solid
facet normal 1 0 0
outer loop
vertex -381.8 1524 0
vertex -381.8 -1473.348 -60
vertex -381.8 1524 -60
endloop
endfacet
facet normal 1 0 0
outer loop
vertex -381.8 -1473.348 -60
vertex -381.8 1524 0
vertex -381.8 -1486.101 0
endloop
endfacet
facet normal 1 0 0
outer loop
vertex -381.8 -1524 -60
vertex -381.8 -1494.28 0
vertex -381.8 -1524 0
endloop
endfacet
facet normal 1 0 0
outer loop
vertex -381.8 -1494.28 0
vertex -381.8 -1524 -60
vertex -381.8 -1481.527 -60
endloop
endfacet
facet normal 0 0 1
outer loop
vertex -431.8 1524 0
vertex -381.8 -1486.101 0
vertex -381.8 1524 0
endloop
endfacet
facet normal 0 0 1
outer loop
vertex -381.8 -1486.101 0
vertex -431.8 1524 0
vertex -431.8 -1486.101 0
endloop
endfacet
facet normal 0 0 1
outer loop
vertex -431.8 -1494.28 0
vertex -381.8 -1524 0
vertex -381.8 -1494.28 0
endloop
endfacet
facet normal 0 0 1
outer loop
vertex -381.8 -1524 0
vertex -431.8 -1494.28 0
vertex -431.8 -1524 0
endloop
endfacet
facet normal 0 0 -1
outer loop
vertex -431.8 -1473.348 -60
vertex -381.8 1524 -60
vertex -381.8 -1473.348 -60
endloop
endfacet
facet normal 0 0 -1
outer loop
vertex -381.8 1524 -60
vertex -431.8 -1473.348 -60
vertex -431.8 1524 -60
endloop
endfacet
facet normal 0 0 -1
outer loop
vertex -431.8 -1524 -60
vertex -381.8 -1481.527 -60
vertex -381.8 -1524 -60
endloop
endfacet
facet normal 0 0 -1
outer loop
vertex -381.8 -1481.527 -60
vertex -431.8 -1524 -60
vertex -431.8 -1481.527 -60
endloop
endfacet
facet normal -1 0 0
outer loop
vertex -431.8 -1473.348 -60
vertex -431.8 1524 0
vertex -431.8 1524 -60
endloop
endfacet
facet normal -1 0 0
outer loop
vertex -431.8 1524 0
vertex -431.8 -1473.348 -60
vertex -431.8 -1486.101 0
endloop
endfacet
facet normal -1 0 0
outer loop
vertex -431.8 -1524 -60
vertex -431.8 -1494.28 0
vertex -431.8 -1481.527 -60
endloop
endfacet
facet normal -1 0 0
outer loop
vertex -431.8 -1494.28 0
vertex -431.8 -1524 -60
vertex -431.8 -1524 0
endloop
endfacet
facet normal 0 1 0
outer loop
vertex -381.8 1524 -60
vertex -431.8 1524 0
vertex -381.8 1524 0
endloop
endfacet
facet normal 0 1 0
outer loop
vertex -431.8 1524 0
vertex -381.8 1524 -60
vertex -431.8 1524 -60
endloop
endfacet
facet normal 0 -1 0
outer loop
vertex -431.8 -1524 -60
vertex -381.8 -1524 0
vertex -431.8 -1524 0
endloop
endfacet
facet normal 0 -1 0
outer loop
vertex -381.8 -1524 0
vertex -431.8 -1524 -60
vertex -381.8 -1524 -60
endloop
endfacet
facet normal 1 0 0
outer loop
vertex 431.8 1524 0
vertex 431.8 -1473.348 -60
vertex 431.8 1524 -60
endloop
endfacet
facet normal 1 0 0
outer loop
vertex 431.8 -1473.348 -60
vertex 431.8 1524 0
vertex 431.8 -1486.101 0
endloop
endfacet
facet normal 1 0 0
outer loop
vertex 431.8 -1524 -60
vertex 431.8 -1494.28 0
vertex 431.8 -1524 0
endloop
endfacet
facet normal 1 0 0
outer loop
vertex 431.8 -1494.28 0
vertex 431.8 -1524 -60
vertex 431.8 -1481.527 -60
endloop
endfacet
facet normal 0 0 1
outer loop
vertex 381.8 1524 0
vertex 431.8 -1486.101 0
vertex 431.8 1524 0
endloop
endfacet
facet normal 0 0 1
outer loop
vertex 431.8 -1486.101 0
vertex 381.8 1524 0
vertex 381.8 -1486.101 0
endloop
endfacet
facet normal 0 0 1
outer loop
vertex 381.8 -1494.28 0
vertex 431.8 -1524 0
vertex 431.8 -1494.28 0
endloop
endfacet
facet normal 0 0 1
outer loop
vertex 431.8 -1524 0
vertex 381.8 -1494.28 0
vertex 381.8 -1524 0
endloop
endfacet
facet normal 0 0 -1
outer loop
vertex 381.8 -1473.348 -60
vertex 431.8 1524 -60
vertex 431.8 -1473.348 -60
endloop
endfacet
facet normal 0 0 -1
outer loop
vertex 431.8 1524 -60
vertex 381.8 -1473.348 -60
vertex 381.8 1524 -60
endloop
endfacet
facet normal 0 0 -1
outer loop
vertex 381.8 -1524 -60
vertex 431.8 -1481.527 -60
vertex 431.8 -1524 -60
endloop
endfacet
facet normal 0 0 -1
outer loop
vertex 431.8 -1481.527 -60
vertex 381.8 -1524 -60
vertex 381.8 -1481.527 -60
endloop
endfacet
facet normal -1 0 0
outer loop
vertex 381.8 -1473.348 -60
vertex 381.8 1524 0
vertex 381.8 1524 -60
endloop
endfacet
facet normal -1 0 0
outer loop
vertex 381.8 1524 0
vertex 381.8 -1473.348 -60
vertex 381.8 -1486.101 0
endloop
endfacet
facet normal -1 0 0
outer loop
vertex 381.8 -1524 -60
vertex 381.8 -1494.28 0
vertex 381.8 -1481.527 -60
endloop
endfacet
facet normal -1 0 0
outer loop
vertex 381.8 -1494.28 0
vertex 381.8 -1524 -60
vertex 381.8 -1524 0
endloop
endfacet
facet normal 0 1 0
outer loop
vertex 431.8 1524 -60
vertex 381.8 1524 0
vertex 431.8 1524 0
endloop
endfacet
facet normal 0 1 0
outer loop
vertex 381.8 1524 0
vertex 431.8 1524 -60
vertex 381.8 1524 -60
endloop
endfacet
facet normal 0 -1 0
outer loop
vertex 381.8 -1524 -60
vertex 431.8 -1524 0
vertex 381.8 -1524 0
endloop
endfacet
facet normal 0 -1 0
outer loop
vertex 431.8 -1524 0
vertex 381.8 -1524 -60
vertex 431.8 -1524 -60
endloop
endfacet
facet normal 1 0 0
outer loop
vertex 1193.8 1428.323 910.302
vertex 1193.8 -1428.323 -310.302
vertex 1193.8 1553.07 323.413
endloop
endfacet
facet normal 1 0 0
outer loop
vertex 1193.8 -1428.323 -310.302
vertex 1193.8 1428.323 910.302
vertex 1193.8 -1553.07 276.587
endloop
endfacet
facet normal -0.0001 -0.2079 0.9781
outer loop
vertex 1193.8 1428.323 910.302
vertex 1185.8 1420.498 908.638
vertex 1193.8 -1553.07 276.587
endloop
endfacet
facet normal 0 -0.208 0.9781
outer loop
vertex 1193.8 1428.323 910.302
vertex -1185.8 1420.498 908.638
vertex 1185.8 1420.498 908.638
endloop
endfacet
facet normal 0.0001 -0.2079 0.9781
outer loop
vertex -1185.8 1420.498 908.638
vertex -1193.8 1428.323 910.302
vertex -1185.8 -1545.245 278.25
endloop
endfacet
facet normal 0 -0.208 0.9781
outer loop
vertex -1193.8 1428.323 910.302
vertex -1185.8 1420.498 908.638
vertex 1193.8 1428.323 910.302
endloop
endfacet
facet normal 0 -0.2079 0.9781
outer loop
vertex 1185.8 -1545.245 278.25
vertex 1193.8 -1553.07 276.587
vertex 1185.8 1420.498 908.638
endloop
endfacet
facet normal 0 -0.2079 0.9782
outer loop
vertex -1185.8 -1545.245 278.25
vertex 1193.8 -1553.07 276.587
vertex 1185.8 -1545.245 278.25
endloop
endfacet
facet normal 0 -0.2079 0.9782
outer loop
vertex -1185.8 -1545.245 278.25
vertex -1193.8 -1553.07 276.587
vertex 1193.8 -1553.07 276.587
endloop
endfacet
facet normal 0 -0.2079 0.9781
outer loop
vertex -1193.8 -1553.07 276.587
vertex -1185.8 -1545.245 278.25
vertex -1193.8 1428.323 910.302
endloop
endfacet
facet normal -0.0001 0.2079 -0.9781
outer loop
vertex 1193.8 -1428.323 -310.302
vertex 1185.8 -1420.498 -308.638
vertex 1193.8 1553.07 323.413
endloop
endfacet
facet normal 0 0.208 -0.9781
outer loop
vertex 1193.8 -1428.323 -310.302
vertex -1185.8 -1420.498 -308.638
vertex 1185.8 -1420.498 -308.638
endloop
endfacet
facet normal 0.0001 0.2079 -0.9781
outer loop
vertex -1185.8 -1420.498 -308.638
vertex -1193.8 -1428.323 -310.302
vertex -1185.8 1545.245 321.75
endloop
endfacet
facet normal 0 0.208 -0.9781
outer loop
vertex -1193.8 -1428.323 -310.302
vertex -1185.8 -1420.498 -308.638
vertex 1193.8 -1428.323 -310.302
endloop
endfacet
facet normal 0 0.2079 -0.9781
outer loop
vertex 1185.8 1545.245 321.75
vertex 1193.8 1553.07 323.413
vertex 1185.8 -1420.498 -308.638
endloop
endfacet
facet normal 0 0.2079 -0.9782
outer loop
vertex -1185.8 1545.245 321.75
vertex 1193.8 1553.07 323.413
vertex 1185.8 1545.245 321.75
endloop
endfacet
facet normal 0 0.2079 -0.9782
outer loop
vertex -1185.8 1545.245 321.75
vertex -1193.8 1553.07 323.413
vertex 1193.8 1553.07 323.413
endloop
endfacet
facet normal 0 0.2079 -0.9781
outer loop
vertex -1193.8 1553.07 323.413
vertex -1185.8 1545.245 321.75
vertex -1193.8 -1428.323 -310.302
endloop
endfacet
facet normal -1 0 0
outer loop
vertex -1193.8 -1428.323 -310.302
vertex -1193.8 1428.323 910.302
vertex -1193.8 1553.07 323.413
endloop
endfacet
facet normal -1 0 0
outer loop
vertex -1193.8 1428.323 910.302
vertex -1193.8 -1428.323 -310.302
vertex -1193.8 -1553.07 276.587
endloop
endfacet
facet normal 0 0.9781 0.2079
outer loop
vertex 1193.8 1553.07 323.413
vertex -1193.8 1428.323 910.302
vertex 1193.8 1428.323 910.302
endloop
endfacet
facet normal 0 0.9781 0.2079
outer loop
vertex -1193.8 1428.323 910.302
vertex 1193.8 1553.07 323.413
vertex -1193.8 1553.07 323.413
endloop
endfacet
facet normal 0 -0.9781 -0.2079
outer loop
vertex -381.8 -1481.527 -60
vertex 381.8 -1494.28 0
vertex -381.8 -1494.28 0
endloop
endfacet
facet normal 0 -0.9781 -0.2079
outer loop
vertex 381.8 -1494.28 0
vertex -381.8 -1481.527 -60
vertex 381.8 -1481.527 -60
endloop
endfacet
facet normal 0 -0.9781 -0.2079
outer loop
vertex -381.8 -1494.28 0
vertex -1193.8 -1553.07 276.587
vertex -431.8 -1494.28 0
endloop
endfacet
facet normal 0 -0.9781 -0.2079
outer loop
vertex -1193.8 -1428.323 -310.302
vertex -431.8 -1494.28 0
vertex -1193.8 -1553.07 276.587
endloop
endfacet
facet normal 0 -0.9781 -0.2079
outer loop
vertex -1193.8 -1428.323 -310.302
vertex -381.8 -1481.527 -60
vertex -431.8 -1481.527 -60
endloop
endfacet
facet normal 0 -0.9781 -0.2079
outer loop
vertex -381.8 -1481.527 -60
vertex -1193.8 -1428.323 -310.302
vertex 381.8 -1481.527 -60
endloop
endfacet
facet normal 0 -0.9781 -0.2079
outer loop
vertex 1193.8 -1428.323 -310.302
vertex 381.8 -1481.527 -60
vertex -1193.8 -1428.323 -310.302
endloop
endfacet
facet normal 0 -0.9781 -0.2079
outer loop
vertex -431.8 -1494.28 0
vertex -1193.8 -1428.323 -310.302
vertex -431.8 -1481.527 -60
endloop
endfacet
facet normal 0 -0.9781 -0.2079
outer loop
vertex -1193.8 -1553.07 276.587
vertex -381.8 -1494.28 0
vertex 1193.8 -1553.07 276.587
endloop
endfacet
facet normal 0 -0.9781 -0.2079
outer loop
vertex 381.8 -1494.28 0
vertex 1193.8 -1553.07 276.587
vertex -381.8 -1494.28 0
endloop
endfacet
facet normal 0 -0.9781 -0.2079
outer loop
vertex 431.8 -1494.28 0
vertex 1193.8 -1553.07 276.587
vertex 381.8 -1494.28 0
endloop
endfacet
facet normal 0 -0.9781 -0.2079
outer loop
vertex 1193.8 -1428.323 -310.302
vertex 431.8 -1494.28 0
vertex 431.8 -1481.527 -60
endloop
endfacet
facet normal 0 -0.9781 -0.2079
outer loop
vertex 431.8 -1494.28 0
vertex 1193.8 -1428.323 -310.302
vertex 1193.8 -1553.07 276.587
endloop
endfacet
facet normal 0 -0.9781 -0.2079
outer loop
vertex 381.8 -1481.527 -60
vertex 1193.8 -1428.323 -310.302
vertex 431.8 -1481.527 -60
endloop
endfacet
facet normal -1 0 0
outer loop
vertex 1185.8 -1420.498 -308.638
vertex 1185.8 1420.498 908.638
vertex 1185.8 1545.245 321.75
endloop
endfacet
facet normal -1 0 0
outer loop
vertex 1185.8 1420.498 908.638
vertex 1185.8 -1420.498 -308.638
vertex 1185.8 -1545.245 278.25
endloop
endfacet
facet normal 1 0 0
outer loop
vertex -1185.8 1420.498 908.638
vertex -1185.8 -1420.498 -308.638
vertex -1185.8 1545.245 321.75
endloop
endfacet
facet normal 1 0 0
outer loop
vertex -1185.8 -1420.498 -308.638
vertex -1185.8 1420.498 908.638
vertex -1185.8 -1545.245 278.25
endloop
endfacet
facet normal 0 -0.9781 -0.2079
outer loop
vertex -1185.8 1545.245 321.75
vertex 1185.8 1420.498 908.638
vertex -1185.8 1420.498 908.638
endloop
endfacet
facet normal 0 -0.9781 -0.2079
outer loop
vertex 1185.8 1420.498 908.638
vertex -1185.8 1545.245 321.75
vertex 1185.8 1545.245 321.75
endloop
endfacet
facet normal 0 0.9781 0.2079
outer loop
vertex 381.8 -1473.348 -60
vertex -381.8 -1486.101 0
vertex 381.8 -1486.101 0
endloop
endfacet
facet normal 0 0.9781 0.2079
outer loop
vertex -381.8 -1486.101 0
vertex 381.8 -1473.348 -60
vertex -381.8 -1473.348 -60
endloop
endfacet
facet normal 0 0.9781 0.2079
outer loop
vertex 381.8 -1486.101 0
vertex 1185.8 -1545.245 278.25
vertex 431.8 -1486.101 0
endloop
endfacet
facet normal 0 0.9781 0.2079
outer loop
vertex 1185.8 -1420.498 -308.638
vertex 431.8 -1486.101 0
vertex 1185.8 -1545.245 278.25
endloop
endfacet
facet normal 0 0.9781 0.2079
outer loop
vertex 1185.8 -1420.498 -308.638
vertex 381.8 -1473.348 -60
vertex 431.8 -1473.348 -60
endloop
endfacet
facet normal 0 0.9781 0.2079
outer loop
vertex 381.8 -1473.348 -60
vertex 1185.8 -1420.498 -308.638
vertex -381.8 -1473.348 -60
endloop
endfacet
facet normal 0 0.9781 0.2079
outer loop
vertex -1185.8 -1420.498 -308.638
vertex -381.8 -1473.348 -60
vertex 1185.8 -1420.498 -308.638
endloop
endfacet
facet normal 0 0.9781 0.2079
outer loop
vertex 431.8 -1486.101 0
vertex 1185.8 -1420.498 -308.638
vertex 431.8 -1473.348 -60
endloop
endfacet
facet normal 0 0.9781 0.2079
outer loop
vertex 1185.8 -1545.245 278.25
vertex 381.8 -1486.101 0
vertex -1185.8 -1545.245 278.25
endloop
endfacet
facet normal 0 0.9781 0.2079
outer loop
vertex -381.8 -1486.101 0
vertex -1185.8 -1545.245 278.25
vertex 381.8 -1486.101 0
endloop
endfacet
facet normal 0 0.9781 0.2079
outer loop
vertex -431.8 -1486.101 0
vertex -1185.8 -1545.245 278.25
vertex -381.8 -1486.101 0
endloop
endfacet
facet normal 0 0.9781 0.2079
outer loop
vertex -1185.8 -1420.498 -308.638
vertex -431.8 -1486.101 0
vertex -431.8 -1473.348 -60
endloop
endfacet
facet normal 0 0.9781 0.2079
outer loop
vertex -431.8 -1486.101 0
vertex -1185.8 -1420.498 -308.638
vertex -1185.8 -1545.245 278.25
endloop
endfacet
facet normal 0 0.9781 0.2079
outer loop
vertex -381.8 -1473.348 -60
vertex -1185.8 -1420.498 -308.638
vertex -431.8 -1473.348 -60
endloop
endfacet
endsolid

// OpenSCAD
// ====================================================================================
// REVOLUTIONARY TECHNOLOGY COMPANY & UNIVERSITY OF WASHINGTON DEPARTMENT OF PHYSICS
// Module: silverado_md_all_beds.scad (Parametric Multi-Industry Fleet Bed Matrix)
// Core Application: One Frame Mating Interface Hosting 10 Separate Industrial Configurations
// Center Origin (0,0,0) = Mid-point of Cab-to-Axle (CA) Longitudinal Frame Interface
// ====================================================================================

$fn = 100; // High-precision industrial manufacturing rendering finish

// --- Master Industrial Upfit Selector ---
// 1 = Tow Truck, 2 = Utility, 3 = EMT, 4 = Fire, 5 = Police Cage,
// 6 = Dump Truck, 7 = Lumber Flatbed, 8 = Box Truck, 9 = Military Cargo, 10 = Anti-Air Turret Base
INDUSTRIAL_BED_VARIANT = 6; 

// --- Commercial Geometry Parameter Tables ---
inch_to_mm         = 25.4;
bed_length         = (INDUSTRIAL_BED_VARIANT == 8 || INDUSTRIAL_BED_VARIANT == 7) ? 144.0 * inch_to_mm : 120.0 * inch_to_mm; // 12ft vs 10ft profiles
bed_width          = 94.0 * inch_to_mm;  // Standard wide-track commercial dually width footprint
mating_rail_w      = 34.0 * inch_to_mm;  // 863.60 mm standard straight truck rail track [INDEX]
plate_thickness    = 6.35;               // 1/4" heavy-duty plate base thickness

variant_manifest = ["TOW_TRUCK_ROLLBACK", "UTILITY_SERVICE_BODY", "EMT_AMBULANCE_POD", "FIRE_PUMPER_CORE", "POLICE_RIOT_CAGE", "VOCATIONAL_DUMP_BED", "LUMBER_STAKE_BED", "DRY_FREIGHT_BOX", "TACTICAL_MILITARY_DECK", "ANTI_AIR_TURRET_BASE"];

module universal_chassis_mating_subframe() {
    echo(str("STAMPING INDUSTRIAL FLEET CARGO PLATFORM: ", variant_manifest[INDUSTRIAL_BED_VARIANT-1]));
    // Dual parallel longitudinal stringer channels that slide straight onto your Titanium Frame Rails [INDEX]
    color("DarkSlateGrey") {
        for (side = [-1, 1]) {
            translate([side * (mating_rail_w/2 - 25), 0, -30])
                cube([50, bed_length, 60], center=true);
        }
    }
}

module deploy_variant_specific_cargo_geometry() {
    // Generates the unique industrial tool workspace shell based on active selector index
    if (INDUSTRIAL_BED_VARIANT == 1) { // Tow Truck Rollback Bed
        color("Silver") translate([0, -20, 20]) rotate([8, 0, 0]) cube([bed_width, bed_length, 12], center=true);
    }
    else if (INDUSTRIAL_BED_VARIANT == 2) { // Utility Service Bed (OtterBox Compartment Design) [INDEX]
        color("DimGrey") difference() {
            cube([bed_width, bed_length, 900], center=true);
            cube([bed_width - 300, bed_length + 10, 910], center=true); // Hollow center load bed cavity
        }
    }
    else if (INDUSTRIAL_BED_VARIANT == 3 || INDUSTRIAL_BED_VARIANT == 5) { // EMT Rescue Pod / Police Cage
        color("White") translate([0, 0, 450]) cube([bed_width, bed_length, 900], center=true);
    }
    else if (INDUSTRIAL_BED_VARIANT == 4) { // Fire Quick-Attack Pumper
        color("Red") translate([0, 0, 400]) cube([bed_width - 40, bed_length - 40, 800], center=true);
    }
    else if (INDUSTRIAL_BED_VARIANT == 6) { // Vocational Tipping Dump Bed
        color("DarkSlateGrey") translate([0, 0, 300]) rotate([12, 0, 0]) difference() {
            cube([bed_width, bed_length, 600], center=true);
            translate([0, 0, 10]) cube([bed_width - 16, bed_length - 16, 620], center=true); // Hollow dump pan container
        }
    }
    else if (INDUSTRIAL_BED_VARIANT == 7) { // Heavy Lumber Stake-Bed
        color("SaddleBrown") translate([0, 0, 6]) cube([bed_width, bed_length, 12], center=true);
        for (x = [-bed_width/2, bed_width/2]) {
            for (y = [-bed_length/2 : 400 : bed_length/2]) {
                translate([x, y, 300]) color("White") cube([15, 40, 600], center=true); // Removable stake posts
            }
        }
    }
    else if (INDUSTRIAL_BED_VARIANT == 8) { // Dry-Freight Box Truck Cube
        color("White") translate([0, 0, 1000]) cube([bed_width, bed_length, 2000], center=true);
    }
    else if (INDUSTRIAL_BED_VARIANT == 9) { // Tactical Military Cargo Pod
        color("OliveDrab") translate([0, 0, 200]) cube([bed_width, bed_length, 400], center=true);
    }
    else if (INDUSTRIAL_BED_VARIANT == 10) { // Anti-Air Turret Mount Ring Base
        color("DarkOliveGreen") {
            translate([0, 0, 12]) cube([bed_width, bed_length, 24], center=true);
            translate([0, 0, 50]) cylinder(d=1200, h=60, center=true); // Heavy reinforced structural rotation gear ring
        }
    }
}

// --- Composite Industrial Fleet Assembly Compile Matrix ---
union() {
    universal_chassis_mating_subframe();
    deploy_variant_specific_cargo_geometry();
}
